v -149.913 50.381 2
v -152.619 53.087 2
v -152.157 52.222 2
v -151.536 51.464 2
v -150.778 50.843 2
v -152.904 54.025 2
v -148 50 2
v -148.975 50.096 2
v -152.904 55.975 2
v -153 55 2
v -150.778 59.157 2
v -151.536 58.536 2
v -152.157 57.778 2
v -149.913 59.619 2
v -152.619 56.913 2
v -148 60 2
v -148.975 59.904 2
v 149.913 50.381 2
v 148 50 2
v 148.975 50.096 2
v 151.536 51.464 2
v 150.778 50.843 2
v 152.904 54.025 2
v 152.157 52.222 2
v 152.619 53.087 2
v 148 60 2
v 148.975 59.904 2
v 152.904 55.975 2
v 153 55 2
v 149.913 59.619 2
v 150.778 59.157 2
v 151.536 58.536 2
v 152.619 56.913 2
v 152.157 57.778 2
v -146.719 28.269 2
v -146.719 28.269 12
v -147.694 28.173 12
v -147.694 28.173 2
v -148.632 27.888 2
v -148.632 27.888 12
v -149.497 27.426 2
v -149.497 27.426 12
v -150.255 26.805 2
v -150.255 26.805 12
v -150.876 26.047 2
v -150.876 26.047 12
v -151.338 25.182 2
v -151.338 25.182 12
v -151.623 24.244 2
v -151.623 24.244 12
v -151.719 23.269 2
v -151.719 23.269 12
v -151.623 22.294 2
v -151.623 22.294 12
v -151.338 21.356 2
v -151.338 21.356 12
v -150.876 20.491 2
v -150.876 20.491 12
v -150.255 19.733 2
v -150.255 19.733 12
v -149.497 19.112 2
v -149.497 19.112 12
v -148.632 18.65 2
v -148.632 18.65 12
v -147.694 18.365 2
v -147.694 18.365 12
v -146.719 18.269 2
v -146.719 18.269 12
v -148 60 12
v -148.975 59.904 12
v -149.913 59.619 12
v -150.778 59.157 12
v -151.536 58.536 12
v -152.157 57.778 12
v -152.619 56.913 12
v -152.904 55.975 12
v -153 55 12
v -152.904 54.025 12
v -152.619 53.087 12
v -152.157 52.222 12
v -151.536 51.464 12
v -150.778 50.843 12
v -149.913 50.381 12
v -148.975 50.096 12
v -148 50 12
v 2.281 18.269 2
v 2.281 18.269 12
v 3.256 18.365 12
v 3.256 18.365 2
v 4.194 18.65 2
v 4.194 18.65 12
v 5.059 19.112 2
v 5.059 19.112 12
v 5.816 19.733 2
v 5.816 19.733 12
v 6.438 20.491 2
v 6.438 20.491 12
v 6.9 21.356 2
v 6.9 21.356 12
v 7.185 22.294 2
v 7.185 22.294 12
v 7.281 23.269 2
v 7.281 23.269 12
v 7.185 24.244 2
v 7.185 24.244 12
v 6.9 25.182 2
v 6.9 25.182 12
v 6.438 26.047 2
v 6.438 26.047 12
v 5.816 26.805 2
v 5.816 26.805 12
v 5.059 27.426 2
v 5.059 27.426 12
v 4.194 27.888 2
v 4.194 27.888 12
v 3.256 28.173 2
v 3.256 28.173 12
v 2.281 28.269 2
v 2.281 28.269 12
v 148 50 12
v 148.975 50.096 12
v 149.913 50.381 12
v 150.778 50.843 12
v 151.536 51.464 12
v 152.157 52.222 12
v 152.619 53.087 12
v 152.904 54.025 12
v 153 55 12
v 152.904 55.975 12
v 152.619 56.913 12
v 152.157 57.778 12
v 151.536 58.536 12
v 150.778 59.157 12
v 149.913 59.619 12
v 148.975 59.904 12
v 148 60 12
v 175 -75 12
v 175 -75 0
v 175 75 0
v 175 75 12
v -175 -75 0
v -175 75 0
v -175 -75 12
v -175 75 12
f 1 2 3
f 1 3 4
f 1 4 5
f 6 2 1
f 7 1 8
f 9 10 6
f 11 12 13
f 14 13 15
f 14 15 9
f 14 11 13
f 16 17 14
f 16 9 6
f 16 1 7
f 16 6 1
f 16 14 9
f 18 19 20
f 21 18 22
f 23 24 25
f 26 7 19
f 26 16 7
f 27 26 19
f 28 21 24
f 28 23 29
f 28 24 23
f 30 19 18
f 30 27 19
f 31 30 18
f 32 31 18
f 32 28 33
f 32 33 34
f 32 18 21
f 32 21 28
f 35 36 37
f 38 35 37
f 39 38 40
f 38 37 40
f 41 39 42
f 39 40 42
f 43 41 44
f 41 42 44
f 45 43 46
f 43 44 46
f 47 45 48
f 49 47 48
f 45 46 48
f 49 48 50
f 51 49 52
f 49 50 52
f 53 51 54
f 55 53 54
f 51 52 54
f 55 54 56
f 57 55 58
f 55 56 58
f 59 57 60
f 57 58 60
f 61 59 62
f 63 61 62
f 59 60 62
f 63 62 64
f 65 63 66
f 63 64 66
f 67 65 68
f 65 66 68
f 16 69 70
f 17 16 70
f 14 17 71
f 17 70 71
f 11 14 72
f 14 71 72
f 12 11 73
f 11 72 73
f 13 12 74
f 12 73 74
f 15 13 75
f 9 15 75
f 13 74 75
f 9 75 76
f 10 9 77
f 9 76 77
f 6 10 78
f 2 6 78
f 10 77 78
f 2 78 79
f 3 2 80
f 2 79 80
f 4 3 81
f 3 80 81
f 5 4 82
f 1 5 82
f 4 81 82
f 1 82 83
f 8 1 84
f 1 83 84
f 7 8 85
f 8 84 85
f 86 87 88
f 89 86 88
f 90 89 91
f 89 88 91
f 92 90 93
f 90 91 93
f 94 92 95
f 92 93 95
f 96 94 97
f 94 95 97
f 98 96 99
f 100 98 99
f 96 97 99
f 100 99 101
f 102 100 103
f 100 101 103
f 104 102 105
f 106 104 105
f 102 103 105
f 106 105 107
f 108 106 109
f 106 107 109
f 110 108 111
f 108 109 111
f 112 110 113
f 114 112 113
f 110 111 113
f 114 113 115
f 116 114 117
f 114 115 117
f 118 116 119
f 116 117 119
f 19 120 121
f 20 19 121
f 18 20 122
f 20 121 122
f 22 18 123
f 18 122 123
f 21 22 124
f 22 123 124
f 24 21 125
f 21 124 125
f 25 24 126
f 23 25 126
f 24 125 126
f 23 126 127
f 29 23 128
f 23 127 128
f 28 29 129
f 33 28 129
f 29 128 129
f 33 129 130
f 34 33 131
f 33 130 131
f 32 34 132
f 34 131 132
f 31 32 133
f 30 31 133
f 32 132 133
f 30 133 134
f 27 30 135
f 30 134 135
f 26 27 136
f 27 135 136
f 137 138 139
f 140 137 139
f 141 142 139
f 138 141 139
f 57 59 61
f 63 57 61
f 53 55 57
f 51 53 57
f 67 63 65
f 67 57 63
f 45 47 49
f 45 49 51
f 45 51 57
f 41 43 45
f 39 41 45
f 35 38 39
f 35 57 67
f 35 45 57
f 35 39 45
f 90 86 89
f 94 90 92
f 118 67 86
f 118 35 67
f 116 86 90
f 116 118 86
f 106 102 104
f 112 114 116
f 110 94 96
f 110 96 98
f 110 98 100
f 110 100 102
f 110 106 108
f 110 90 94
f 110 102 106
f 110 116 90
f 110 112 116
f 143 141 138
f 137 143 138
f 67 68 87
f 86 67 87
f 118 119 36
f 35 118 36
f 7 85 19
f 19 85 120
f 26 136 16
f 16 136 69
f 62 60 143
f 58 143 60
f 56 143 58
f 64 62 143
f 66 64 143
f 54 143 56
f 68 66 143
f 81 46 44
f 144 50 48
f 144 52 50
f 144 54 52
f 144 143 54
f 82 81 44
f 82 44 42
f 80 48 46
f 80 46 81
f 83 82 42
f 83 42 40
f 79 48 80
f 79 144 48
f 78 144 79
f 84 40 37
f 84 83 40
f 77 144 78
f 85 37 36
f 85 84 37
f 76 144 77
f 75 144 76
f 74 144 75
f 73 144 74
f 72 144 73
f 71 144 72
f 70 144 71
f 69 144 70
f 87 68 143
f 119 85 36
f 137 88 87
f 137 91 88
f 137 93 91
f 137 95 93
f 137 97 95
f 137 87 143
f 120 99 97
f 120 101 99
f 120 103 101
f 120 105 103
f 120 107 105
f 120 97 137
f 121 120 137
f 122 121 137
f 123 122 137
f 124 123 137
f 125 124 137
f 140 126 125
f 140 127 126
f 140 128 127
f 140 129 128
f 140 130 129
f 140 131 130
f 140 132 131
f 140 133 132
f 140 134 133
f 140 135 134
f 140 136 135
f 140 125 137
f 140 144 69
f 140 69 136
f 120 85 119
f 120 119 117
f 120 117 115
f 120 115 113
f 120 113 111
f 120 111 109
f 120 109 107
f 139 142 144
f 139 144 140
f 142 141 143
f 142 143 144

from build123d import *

# Parameters (mm, degrees)
F0_W     = 350
F0_H     = 150
F1_DEPTH = 12
F3_DEPTH = 10


with BuildPart() as f1:
    # F0 (on Top) → F1 (new body)
    with BuildSketch(Plane.XY):
        Rectangle(F0_W, F0_H)
    extrude(amount=F1_DEPTH)

    # F2 (on face) → F3 (cut)
    with BuildSketch(Plane.XY.offset(12)):
        with BuildLine():
            Line((148, 60), (-148, 60))
            ThreePointArc((-148, 60), (-153, 55), (-148, 50))
            Line((-148, 50), (148, 50))
            ThreePointArc((148, 50), (153, 55), (148, 60))
        make_face()
        with BuildLine():
            ThreePointArc((2.280964, 18.268998), (7.280964, 23.268998), (2.280964, 28.268998))
            Line((2.280964, 28.268998), (-146.719036, 28.268998))
            ThreePointArc((-146.719036, 28.268998), (-151.719036, 23.268998), (-146.719036, 18.268998))
            Line((-146.719036, 18.268998), (2.280964, 18.268998))
        make_face()
    extrude(amount=-F3_DEPTH, mode=Mode.SUBTRACT)


solid = f1.part
